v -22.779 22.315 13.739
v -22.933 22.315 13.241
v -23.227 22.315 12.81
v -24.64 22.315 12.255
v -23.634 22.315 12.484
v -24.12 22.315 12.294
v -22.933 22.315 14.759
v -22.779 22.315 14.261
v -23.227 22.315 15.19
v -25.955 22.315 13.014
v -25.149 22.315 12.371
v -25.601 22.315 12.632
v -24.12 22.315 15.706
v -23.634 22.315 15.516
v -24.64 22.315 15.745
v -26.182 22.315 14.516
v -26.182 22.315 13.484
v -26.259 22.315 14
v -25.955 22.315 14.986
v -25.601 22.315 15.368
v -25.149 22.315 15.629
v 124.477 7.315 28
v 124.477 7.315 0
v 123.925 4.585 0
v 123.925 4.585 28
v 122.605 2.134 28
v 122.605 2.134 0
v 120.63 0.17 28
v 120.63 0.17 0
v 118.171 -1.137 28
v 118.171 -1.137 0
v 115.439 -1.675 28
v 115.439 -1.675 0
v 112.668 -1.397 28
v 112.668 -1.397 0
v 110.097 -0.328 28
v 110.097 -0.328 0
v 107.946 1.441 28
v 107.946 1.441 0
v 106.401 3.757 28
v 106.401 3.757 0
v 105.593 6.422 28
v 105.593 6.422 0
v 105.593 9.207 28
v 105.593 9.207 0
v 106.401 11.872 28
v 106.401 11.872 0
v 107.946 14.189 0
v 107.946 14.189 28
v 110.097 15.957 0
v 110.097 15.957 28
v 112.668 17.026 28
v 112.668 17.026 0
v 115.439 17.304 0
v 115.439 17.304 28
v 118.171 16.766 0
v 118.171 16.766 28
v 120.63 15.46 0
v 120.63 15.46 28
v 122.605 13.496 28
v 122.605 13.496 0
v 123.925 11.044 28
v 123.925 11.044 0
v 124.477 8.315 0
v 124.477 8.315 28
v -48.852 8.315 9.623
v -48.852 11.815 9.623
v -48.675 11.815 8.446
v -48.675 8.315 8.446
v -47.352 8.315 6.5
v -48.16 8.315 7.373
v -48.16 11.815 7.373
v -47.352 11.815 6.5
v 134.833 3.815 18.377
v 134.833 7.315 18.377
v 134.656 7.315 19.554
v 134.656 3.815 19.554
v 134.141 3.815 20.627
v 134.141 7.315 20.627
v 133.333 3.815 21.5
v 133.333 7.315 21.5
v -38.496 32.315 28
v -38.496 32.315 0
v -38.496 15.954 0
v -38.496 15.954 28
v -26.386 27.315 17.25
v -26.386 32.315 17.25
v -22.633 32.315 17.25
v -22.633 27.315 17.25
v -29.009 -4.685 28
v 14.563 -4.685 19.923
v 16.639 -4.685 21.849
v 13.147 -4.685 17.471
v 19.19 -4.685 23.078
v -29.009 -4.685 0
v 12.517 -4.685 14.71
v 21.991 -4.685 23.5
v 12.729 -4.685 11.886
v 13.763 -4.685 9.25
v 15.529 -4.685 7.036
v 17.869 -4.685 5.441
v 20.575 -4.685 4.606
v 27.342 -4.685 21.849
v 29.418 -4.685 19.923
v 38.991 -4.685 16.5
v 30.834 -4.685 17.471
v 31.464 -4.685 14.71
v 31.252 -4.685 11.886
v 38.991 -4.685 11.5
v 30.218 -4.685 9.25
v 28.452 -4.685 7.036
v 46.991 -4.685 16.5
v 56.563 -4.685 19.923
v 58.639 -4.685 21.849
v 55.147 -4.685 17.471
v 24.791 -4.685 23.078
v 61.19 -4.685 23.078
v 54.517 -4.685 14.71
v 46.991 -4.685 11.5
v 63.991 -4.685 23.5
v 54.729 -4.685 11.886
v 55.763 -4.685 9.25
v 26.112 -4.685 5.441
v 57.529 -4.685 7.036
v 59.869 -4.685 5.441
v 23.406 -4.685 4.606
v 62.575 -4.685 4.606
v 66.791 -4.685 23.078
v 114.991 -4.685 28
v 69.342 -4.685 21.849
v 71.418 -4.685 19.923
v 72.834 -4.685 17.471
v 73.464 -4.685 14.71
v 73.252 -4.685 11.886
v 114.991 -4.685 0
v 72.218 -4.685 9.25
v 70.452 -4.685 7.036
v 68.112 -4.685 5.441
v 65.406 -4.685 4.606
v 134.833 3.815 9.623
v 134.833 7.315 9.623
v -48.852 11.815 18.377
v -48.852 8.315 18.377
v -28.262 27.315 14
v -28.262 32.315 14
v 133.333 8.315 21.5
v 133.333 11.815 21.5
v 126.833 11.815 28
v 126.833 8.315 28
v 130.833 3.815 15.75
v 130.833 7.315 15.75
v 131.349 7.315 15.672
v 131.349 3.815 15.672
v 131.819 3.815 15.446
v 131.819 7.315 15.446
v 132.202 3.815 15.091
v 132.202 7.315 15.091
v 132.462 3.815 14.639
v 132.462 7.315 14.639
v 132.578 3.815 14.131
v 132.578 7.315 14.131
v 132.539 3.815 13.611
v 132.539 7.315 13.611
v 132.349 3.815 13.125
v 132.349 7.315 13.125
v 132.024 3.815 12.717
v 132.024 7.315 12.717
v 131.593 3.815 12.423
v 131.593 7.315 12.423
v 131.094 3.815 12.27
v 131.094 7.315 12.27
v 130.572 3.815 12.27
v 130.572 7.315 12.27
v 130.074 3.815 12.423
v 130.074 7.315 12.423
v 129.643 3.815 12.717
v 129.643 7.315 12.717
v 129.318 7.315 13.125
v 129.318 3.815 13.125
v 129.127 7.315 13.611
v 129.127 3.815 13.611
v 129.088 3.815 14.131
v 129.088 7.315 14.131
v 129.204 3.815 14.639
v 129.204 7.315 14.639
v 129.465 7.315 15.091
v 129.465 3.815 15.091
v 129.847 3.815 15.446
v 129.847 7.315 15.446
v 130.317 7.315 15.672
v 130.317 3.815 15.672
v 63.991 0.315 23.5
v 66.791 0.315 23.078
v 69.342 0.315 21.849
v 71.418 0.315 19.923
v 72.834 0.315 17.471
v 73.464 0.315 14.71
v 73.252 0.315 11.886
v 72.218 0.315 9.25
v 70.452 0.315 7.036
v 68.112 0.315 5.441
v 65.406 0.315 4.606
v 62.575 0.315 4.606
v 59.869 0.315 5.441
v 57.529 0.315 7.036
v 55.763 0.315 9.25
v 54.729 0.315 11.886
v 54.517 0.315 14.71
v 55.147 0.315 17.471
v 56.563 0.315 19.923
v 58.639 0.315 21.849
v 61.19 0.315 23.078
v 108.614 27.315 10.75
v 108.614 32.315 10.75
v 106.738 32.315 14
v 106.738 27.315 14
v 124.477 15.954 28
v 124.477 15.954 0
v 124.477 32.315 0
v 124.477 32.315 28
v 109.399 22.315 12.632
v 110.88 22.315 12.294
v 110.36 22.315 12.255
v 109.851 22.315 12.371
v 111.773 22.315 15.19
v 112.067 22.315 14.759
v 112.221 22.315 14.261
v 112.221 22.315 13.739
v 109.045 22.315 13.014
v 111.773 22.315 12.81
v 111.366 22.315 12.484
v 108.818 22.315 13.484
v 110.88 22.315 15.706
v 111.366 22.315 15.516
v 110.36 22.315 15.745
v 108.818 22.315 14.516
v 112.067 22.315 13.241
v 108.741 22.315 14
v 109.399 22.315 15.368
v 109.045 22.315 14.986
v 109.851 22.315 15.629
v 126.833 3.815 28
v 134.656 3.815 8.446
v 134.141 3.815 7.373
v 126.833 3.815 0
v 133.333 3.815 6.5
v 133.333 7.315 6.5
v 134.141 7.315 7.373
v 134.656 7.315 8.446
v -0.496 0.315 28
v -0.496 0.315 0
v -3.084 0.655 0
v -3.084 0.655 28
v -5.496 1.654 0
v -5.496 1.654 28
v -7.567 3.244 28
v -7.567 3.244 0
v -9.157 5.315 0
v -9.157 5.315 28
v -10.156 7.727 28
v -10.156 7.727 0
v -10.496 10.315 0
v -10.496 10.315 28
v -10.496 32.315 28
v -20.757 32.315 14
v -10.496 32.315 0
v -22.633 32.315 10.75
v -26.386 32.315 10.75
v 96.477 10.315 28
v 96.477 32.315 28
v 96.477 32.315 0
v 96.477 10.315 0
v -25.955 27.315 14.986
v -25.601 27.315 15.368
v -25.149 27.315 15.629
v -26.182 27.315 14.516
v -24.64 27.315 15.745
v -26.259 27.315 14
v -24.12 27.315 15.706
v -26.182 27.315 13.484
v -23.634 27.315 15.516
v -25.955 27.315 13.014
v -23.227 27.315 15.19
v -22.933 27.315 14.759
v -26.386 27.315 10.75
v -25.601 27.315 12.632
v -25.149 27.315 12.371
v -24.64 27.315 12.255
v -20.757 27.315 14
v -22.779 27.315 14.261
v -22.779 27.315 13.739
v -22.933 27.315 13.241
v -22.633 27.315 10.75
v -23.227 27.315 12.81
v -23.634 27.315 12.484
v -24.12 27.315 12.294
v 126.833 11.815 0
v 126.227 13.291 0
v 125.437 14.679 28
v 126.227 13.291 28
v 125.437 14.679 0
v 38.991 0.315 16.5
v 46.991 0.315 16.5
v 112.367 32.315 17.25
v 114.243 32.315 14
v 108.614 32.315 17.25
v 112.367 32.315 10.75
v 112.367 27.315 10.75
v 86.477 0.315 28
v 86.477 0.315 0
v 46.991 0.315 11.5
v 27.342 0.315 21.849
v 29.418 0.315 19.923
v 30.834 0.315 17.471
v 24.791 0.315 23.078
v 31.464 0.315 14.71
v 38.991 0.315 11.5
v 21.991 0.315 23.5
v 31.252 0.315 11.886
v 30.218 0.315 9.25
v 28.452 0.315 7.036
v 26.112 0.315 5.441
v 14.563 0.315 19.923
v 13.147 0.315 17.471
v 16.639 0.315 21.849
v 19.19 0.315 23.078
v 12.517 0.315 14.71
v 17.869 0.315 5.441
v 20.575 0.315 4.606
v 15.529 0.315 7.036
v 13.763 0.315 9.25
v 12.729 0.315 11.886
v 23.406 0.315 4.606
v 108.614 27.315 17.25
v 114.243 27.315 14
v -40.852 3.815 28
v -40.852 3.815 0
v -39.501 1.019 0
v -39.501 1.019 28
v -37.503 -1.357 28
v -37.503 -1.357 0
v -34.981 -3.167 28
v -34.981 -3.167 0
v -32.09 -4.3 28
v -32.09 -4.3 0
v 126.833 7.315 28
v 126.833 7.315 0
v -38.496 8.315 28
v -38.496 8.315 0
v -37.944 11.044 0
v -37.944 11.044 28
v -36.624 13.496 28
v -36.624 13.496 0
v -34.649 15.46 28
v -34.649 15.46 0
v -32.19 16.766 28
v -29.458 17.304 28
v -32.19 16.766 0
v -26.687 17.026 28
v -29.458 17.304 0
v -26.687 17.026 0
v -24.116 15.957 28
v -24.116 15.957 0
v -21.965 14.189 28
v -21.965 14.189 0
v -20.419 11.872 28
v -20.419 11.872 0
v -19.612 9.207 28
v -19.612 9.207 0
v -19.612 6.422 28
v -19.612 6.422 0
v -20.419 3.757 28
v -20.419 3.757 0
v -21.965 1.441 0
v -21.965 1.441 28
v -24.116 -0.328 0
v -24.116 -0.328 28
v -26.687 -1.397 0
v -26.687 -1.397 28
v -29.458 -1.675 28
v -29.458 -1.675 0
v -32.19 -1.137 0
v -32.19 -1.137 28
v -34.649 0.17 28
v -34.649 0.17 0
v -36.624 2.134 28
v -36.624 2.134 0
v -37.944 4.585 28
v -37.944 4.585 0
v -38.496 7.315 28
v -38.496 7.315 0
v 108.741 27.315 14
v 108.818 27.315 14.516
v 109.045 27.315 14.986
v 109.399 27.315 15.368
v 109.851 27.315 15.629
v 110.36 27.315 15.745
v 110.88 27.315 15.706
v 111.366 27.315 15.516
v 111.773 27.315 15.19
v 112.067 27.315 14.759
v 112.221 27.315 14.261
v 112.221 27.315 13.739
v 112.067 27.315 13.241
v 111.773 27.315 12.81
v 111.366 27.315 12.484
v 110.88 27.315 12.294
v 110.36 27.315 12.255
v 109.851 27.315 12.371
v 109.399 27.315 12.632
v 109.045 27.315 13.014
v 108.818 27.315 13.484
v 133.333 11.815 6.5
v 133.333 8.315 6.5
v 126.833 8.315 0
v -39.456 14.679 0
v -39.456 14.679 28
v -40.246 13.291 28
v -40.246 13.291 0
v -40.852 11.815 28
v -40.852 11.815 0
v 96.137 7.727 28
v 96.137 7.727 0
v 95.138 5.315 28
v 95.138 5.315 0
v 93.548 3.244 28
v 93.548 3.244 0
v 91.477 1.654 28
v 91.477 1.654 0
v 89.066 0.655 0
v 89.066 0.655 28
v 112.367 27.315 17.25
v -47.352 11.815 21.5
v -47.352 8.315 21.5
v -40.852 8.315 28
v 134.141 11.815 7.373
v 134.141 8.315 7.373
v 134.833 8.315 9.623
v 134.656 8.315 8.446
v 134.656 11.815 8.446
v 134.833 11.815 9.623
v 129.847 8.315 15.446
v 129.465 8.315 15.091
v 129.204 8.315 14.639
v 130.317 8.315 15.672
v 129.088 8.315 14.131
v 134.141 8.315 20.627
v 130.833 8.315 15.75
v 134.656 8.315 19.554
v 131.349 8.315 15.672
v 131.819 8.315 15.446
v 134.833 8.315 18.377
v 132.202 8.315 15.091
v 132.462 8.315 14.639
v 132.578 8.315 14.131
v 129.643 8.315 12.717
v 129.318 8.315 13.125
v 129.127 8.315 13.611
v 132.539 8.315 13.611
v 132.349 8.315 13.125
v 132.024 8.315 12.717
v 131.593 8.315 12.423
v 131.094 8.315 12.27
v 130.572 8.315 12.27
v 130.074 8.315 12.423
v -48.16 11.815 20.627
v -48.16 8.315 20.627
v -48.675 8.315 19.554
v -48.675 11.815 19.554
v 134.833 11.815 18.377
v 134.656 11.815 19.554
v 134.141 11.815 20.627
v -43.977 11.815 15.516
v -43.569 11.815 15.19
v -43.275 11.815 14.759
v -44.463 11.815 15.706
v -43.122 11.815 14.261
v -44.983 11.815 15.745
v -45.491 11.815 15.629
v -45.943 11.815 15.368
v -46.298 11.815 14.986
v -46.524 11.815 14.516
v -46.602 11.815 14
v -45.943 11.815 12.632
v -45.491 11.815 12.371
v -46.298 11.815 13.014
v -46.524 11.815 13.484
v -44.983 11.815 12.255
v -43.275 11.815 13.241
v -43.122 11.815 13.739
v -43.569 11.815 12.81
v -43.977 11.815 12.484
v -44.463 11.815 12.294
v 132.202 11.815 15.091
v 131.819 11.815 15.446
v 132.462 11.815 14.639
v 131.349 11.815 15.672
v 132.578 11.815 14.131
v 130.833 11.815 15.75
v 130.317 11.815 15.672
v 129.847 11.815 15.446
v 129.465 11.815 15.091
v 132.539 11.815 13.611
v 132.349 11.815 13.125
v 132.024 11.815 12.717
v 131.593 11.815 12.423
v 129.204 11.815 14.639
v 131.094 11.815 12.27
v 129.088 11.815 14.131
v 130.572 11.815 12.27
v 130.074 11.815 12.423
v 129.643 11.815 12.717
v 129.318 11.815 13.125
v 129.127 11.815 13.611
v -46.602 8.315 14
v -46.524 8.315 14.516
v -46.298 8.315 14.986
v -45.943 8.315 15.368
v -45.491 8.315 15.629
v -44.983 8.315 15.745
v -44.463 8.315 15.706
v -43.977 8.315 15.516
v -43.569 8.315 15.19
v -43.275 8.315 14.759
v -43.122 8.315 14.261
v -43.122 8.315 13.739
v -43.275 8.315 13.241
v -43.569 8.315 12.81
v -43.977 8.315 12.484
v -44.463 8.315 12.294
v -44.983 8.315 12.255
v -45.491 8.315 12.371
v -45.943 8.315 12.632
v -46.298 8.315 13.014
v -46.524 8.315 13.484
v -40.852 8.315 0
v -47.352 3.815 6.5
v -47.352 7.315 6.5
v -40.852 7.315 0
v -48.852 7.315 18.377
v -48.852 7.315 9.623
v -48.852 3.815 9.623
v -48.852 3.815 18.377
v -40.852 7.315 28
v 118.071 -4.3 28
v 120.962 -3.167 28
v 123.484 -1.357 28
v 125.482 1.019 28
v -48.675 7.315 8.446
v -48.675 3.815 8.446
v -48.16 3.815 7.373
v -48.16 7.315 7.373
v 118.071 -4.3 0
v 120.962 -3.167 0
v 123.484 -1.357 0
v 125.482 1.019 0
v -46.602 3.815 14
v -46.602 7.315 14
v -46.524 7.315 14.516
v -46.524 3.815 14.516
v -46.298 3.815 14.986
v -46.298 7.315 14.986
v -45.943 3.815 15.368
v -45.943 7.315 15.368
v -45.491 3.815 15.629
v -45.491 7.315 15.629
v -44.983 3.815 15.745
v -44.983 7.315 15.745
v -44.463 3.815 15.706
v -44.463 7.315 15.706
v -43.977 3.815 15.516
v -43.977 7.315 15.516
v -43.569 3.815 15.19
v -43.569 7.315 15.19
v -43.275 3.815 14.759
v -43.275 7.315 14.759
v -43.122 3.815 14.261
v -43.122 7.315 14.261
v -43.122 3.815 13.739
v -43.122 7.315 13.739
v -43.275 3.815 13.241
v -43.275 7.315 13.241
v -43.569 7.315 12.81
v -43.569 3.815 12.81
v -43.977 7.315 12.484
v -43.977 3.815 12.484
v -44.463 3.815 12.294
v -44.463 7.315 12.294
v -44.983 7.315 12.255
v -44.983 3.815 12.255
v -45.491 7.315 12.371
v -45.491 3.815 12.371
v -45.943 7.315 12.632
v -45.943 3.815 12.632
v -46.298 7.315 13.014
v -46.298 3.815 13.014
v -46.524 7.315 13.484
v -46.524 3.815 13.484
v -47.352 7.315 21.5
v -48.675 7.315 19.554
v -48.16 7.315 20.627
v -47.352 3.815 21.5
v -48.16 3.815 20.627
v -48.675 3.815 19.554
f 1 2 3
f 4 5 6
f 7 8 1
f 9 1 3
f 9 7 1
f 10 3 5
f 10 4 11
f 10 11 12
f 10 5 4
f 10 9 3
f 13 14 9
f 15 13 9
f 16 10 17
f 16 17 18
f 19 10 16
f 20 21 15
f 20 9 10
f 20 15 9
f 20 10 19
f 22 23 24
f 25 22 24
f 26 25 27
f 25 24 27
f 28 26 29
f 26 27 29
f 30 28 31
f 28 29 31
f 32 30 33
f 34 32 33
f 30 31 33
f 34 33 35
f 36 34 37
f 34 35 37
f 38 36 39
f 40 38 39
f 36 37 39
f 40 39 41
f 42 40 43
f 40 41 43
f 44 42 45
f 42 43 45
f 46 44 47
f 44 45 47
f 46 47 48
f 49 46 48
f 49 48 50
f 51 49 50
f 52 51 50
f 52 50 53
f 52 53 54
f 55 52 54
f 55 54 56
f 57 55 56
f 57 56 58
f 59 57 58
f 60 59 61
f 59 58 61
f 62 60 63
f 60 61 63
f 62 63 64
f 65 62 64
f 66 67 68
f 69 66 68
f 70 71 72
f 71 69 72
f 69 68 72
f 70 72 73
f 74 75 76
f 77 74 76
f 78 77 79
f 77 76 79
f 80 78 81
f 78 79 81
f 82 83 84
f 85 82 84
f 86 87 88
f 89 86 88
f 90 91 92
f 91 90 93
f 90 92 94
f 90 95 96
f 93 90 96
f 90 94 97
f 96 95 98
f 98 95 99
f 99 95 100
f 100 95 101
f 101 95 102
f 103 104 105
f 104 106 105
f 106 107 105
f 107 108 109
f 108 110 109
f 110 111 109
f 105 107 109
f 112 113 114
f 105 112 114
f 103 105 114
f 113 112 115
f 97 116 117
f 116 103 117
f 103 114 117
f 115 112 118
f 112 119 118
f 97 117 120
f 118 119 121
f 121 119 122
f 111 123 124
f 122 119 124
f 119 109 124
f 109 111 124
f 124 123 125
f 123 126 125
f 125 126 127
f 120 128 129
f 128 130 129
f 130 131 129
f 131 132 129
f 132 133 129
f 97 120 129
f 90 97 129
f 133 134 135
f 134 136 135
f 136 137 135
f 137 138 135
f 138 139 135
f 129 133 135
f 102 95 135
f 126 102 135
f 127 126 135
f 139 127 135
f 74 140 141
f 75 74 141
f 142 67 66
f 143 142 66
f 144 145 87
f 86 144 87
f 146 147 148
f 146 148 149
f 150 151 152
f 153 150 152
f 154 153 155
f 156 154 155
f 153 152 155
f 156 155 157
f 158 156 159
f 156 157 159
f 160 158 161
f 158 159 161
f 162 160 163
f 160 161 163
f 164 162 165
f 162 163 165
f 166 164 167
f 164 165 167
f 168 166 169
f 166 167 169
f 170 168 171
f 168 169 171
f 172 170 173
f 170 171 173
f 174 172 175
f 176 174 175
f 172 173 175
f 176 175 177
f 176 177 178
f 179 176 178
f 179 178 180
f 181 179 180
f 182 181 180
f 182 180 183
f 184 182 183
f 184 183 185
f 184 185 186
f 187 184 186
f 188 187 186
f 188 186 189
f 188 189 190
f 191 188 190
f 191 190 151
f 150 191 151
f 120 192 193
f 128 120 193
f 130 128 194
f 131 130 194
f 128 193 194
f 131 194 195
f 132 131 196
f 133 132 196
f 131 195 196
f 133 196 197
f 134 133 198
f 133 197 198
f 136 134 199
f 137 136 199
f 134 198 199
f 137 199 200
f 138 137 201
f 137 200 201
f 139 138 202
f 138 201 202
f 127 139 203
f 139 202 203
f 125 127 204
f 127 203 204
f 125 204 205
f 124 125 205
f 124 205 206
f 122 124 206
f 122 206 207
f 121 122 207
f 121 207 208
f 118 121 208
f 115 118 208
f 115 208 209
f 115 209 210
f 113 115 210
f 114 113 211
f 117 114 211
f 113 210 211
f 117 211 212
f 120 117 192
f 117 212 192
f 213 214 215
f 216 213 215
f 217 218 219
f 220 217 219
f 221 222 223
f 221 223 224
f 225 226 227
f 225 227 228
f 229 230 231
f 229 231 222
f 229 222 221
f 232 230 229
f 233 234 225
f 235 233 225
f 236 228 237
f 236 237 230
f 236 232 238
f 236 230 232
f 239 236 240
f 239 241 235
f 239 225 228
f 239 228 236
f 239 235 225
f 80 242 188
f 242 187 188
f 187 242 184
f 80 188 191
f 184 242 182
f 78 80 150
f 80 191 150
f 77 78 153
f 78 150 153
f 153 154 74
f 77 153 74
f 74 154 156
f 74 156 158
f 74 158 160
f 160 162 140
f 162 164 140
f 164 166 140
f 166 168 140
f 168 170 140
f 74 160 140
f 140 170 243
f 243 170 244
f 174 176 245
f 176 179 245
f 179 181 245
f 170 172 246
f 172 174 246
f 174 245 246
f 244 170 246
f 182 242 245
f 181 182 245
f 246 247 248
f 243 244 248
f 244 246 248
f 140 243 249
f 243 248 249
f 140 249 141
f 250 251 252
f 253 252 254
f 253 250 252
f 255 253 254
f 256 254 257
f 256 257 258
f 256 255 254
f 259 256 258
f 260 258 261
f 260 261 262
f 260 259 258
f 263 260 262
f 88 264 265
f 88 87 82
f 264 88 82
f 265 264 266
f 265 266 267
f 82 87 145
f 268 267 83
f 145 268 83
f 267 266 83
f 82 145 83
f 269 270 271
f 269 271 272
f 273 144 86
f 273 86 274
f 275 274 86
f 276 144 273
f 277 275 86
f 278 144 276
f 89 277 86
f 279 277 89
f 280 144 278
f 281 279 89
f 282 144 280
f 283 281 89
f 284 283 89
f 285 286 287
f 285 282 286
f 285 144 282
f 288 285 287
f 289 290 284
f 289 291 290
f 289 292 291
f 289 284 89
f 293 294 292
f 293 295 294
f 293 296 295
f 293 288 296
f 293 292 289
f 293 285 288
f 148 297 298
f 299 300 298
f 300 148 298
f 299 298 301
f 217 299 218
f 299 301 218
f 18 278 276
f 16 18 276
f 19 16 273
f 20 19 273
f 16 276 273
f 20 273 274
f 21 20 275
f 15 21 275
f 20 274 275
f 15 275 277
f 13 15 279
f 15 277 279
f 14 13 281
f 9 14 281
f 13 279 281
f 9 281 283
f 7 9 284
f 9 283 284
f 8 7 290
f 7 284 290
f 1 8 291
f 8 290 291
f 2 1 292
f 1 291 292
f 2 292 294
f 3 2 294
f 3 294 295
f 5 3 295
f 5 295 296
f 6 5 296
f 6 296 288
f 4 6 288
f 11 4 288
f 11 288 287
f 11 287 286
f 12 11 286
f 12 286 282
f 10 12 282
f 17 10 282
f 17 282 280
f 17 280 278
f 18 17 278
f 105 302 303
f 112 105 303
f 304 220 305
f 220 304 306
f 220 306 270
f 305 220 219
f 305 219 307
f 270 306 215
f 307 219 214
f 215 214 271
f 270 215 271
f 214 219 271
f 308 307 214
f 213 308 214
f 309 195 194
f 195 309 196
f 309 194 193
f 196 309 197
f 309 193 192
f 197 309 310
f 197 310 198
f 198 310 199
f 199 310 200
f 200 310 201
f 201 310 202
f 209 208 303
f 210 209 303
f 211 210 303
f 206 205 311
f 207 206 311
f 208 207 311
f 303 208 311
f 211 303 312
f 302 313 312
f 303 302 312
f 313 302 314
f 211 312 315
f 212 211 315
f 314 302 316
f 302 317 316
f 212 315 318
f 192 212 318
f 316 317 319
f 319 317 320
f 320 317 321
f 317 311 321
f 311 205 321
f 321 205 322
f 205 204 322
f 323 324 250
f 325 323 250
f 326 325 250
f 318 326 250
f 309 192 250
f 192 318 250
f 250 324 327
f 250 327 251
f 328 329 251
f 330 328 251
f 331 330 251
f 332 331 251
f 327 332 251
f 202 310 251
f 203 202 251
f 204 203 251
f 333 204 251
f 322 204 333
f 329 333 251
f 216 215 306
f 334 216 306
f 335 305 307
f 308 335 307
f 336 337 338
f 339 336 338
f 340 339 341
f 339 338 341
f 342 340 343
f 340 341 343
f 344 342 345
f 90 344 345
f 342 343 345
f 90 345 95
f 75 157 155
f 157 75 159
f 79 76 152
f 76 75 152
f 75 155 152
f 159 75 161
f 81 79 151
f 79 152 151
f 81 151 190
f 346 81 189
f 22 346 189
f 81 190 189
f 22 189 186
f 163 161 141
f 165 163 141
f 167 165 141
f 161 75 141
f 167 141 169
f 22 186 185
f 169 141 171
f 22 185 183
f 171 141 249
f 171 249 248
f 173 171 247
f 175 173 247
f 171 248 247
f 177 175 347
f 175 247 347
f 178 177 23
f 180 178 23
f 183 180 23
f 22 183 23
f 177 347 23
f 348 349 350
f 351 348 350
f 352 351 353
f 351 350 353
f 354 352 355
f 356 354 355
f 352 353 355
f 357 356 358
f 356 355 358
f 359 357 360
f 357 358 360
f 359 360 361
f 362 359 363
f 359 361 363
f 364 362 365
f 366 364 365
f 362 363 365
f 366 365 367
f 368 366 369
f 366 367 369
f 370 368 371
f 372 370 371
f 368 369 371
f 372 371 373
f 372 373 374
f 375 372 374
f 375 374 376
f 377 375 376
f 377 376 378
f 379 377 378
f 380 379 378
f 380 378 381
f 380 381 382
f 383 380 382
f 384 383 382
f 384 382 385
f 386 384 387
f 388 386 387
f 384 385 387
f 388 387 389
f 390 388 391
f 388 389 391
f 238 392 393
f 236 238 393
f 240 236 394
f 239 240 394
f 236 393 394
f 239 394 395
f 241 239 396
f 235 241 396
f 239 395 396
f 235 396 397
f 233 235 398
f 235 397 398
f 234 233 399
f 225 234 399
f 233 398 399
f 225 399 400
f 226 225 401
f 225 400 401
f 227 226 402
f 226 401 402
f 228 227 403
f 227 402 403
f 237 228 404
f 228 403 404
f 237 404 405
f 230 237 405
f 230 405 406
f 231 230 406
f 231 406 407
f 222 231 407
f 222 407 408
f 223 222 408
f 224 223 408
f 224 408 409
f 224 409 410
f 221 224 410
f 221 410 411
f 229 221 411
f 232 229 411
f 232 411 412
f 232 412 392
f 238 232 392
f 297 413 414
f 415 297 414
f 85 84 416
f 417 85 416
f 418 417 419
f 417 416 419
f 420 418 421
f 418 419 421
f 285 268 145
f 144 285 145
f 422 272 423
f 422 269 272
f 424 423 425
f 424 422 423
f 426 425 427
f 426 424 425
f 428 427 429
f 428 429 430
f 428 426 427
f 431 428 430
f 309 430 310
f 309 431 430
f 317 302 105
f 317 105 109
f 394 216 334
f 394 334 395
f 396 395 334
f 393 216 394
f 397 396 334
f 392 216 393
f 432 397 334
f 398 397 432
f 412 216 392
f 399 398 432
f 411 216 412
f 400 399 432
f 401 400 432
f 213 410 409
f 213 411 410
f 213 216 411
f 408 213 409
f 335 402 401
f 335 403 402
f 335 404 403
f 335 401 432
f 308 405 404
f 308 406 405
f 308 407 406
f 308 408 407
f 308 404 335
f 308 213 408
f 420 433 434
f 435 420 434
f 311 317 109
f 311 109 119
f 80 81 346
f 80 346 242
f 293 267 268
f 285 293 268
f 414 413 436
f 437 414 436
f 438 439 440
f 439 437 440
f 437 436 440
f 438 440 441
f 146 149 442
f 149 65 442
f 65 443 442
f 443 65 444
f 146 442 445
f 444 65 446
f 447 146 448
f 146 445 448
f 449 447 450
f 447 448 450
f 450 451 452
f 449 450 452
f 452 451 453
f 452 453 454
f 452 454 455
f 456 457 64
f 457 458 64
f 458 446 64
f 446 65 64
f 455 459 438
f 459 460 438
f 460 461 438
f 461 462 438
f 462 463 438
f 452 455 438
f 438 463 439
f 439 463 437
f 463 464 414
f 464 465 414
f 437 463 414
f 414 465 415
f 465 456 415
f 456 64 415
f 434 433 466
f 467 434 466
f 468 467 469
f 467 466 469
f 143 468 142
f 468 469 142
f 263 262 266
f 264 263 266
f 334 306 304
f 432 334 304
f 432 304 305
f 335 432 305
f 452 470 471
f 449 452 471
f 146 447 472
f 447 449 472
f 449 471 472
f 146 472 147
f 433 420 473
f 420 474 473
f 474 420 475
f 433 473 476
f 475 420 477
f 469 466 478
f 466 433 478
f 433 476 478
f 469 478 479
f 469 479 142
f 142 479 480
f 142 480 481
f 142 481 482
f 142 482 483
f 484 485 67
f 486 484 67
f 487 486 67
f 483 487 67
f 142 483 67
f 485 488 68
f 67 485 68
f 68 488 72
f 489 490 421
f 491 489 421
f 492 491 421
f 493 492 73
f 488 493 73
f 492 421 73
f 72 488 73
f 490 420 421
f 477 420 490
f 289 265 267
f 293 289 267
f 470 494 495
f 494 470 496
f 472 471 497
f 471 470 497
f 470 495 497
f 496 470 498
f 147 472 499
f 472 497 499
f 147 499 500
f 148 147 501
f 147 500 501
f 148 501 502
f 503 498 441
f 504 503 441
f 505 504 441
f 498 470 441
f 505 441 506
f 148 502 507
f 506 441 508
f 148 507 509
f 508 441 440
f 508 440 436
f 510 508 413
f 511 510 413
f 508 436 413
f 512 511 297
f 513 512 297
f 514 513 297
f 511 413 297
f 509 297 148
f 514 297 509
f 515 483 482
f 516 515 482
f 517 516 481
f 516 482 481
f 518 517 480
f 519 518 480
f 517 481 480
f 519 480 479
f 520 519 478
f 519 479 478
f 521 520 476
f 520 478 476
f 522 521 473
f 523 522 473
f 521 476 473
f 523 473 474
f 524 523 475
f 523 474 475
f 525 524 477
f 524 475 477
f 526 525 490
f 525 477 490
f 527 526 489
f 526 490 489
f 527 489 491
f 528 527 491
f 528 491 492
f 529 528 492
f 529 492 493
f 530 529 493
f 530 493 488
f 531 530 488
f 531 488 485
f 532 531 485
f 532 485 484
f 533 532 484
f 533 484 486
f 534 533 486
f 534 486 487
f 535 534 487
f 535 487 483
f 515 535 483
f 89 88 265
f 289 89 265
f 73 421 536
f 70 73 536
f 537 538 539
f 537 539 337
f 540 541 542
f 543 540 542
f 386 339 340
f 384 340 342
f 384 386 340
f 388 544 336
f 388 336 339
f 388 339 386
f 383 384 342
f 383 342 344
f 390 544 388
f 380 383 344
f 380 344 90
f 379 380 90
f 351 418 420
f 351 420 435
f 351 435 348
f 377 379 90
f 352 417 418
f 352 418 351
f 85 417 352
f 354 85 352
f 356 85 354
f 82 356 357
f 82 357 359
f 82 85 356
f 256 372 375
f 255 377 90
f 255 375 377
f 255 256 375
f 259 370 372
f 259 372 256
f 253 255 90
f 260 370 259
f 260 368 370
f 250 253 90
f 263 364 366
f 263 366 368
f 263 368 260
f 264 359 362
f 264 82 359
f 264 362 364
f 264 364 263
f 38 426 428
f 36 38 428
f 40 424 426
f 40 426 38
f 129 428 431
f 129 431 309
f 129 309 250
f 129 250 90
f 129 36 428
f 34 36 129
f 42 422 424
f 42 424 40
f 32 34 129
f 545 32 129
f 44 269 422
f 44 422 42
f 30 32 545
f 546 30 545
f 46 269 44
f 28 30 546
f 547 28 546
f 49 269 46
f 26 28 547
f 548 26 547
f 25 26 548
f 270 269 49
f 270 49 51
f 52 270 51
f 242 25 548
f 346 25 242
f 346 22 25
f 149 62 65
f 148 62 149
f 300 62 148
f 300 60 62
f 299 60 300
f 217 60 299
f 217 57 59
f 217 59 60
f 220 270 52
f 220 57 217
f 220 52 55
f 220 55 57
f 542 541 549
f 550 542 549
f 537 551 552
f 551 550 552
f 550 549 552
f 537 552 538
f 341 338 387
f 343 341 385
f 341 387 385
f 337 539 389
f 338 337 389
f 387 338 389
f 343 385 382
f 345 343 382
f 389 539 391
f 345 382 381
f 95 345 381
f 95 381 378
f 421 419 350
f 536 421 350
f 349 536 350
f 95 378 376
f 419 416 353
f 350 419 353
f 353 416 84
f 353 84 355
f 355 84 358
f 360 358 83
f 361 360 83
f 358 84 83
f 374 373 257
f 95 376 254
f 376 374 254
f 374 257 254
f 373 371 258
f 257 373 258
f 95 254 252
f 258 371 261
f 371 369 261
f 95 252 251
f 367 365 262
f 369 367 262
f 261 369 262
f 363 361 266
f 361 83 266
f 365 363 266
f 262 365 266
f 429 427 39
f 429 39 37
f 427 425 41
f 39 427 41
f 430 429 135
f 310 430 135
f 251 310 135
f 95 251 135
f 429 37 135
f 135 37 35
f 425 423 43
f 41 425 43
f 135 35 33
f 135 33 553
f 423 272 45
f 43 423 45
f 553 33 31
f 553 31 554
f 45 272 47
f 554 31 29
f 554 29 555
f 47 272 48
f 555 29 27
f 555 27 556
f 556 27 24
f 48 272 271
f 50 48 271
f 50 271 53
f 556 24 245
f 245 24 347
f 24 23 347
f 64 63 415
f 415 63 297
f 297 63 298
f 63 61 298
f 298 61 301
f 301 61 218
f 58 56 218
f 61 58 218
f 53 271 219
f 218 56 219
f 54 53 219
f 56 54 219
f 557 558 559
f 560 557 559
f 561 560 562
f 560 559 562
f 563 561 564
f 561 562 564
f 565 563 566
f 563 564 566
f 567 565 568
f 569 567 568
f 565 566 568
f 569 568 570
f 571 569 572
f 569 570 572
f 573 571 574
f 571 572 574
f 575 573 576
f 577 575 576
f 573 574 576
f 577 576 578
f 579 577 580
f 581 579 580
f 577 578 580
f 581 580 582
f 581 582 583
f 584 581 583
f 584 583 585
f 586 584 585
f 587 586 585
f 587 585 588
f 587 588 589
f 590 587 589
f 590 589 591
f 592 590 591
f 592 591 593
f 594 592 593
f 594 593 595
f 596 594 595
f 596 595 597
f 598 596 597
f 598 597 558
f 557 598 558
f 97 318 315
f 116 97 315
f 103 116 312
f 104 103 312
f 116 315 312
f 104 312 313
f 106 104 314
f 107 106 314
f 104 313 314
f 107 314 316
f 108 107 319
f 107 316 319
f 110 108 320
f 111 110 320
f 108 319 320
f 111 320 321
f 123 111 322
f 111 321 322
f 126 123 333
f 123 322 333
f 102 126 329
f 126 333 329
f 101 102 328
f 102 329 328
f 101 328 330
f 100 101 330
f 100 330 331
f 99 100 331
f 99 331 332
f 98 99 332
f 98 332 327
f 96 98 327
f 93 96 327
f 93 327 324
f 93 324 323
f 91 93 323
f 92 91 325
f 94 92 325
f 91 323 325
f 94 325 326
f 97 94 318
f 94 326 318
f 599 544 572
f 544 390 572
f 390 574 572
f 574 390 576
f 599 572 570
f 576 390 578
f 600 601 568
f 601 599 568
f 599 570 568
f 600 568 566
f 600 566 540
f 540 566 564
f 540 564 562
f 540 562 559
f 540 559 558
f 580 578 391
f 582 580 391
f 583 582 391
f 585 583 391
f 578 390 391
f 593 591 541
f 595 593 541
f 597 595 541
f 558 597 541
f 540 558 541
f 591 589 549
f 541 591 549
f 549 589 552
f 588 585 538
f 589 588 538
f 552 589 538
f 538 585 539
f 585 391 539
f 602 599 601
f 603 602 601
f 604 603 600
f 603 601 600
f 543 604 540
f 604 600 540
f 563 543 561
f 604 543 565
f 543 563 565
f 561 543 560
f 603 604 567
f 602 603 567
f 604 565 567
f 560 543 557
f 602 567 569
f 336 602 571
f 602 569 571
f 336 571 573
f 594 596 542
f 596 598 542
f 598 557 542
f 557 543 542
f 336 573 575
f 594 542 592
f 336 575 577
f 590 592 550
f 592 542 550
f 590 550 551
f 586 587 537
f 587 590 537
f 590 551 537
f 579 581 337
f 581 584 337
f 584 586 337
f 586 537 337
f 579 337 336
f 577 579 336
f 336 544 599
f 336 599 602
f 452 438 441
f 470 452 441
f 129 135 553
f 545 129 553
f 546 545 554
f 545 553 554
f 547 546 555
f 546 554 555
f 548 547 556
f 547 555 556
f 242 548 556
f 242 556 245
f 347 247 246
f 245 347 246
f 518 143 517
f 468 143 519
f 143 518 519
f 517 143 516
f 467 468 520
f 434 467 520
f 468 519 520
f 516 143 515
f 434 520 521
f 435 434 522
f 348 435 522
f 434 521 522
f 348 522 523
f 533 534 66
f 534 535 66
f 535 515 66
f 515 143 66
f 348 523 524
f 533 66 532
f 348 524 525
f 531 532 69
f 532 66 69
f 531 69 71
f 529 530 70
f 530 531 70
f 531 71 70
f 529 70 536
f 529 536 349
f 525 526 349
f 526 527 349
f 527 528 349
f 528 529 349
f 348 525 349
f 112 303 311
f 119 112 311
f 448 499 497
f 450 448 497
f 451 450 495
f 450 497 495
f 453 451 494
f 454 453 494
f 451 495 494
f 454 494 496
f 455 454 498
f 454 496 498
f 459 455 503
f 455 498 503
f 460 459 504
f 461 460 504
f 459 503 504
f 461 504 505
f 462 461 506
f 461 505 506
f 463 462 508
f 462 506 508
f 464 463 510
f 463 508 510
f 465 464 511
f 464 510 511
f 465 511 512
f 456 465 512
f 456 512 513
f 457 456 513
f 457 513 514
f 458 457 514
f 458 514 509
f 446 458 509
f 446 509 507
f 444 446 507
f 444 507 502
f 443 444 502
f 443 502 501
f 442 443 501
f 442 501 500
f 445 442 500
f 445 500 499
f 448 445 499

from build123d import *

# Parameters (mm, degrees)
BOSS_EXTRUDE3_DEPTH = 28
FILLET1_R           = 10
SKETCH8_R           = 9.5
SKETCH8_W           = 8
SKETCH8_H           = 5
CUT_EXTRUDE4_DEPTH  = 5
SKETCH9_R           = 1.75
CUT_EXTRUDE5_DEPTH  = 20
SKETCH10_R          = 1.75
CUT_EXTRUDE6_DEPTH  = 10
CUT_EXTRUDE8_DEPTH  = 10
CHAMFER1_SIZE       = 6.5
FILLET3_R           = 4
CUT_EXTRUDE9_DEPTH  = 5


# Some blends are built 0.0001 mm under size
with BuildPart() as part:
    # Sketch7 → Boss-Extrude3 (new body)
    with BuildSketch(Plane.XY):
        with BuildLine():
            Line((-29.009414831, -4.685297633), (114.990585169, -4.685297633))
            ThreePointArc((114.990585169, -4.685297633), (122.279275038, -2.340345638), (126.833304451, 3.814702367))
            Line((126.833304451, 3.814702367), (134.833304451, 3.814702367))
            Line((134.833304451, 3.814702367), (134.833304451, 7.314702367))
            Line((134.833304451, 7.314702367), (127.480581166, 7.314702367))
            Line((127.480581166, 7.314702367), (124.47741815, 7.314702367))
            ThreePointArc((124.47741815, 7.314702367), (105.490585169, 7.814702367), (124.47741815, 8.314702367))
            Line((124.47741815, 8.314702367), (127.480581166, 8.314702367))
            Line((127.480581166, 8.314702367), (134.833304451, 8.314702367))
            Line((134.833304451, 8.314702367), (134.833304451, 11.814702367))
            Line((134.833304451, 11.814702367), (126.833304451, 11.814702367))
            ThreePointArc((126.833304451, 11.814702367), (125.854338173, 13.997652364), (124.47741815, 15.954112665))
            Line((124.47741815, 15.954112665), (124.47741815, 32.314702367))
            Line((124.47741815, 32.314702367), (96.47741815, 32.314702367))
            Line((96.47741815, 32.314702367), (96.47741815, 0.314702367))
            Line((96.47741815, 0.314702367), (-10.496247811, 0.314702367))
            Line((-10.496247811, 0.314702367), (-10.496247811, 32.314702367))
            Line((-10.496247811, 32.314702367), (-38.496247811, 32.314702367))
            Line((-38.496247811, 32.314702367), (-38.496247811, 15.954112665))
            ThreePointArc((-38.496247811, 15.954112665), (-39.873167835, 13.997652364), (-40.852134113, 11.814702367))
            Line((-40.852134113, 11.814702367), (-48.852134113, 11.814702367))
            Line((-48.852134113, 11.814702367), (-48.852134113, 8.314702367))
            Line((-48.852134113, 8.314702367), (-41.499410828, 8.314702367))
            Line((-41.499410828, 8.314702367), (-38.496247811, 8.314702367))
            ThreePointArc((-38.496247811, 8.314702367), (-19.509414831, 7.814702367), (-38.496247811, 7.314702367))
            Line((-38.496247811, 7.314702367), (-41.499410828, 7.314702367))
            Line((-41.499410828, 7.314702367), (-48.852134113, 7.314702367))
            Line((-48.852134113, 7.314702367), (-48.852134113, 3.814702367))
            Line((-48.852134113, 3.814702367), (-40.852134113, 3.814702367))
            ThreePointArc((-40.852134113, 3.814702367), (-36.298104699, -2.340345638), (-29.009414831, -4.685297633))
        make_face()
    extrude(amount=BOSS_EXTRUDE3_DEPTH)

    # Fillet1
    fillet1_edges = [part.edges().sort_by_distance(p)[0] for p in [
        (-10.496247811, 0.314702367, 14),
        (96.47741815, 0.314702367, 14),
    ]]
    fillet(fillet1_edges, radius=FILLET1_R)

    # Sketch8 → Cut-Extrude4 (cut)
    with BuildSketch(Plane(origin=(0, 0.314702367, 0), x_dir=(1, 0, 0), z_dir=(0, 1, 0))):
        with Locations(Location((63.990585169, -14, 0), (0, 0, 270))):
            Circle(SKETCH8_R)
        with Locations(Location((21.990585169, -14, 0), (0, 0, 270))):
            Circle(SKETCH8_R)
        with Locations((42.990585169, -14)):
            Rectangle(SKETCH8_W, SKETCH8_H)
    extrude(amount=-CUT_EXTRUDE4_DEPTH, mode=Mode.SUBTRACT)

    # Sketch9 → Cut-Extrude5 (cut)
    with BuildSketch(Plane(origin=(0, 11.814702367, 0), x_dir=(1, 0, 0), z_dir=(0, 1, 0))):
        with Locations(Location((130.833304451, -14, 0), (0, 0, 270))):
            Circle(SKETCH9_R)
        with Locations(Location((-44.852134113, -14, 0), (0, 0, 180))):
            Circle(SKETCH9_R)
    extrude(amount=-CUT_EXTRUDE5_DEPTH, mode=Mode.SUBTRACT)

    # Sketch10 → Cut-Extrude6 (cut)
    with BuildSketch(Plane(origin=(0, 32.314702367, 0), x_dir=(1, 0, 0), z_dir=(0, 1, 0))):
        with Locations(Location((110.490585169, -14, 0), (0, 0, 180))):
            Circle(SKETCH10_R)
        with Locations(Location((-24.509414831, -14, 0), (0, 0, 180))):
            Circle(SKETCH10_R)
    extrude(amount=-CUT_EXTRUDE6_DEPTH, mode=Mode.SUBTRACT)

    # Sketch12 → Cut-Extrude8 (cut)
    with BuildSketch(Plane(origin=(0, 11.814702367, 0), x_dir=(1, 0, 0), z_dir=(0, 1, 0))):
        Polygon((130.833304451, -21.5), (126.833304451, -21.5), (126.833304451, -28), (134.833304451, -28), (134.833304451, -21.5), align=None)
        Polygon((130.833304451, -6.5), (126.833304451, -6.5), (126.833304451, 0), (134.833304451, 0), (134.833304451, -6.5), align=None)
        Polygon((-44.852134113, -6.5), (-40.852134113, -6.5), (-40.852134113, 0), (-48.852134113, 0), (-48.852134113, -6.5), align=None)
        Polygon((-44.852134113, -21.5), (-48.852134113, -21.5), (-48.852134113, -28), (-40.852134113, -28), (-40.852134113, -21.5), align=None)
    extrude(amount=-CUT_EXTRUDE8_DEPTH, mode=Mode.SUBTRACT)

    # Chamfer1
    chamfer1_edges = [part.edges().sort_by_distance(p)[0] for p in [
        (126.833304451, 10.064702367, 6.5),
        (126.833304451, 5.564702367, 6.5),
        (126.833304451, 5.564702367, 21.5),
        (126.833304451, 10.064702367, 21.5),
        (-40.852134113, 5.564702367, 21.5),
        (-40.852134113, 5.564702367, 6.5),
        (-40.852134113, 10.064702367, 6.5),
        (-40.852134113, 10.064702367, 21.5),
    ]]
    chamfer(chamfer1_edges, length=CHAMFER1_SIZE - 0.0001)  # a hair under: the kernel refuses the full size

    # Fillet3
    # the kernel refuses this fillet: 4 mm, written as the material it takes off along each edge
    with BuildSketch(Plane(origin=(134.833304451, 19.621150019, 21.5), x_dir=(-1, 0, 0), z_dir=(0, -1, 0))) as fillet3_piece_1:
        with BuildLine():
            CenterArc((4, 3.122579061), FILLET3_R, 180, 51.319647456)
            Line((0, 3.122579061), (-0.08, 3.122579061))
            Line((-0.08, 3.122579061), (-0.08, 0))
            Line((-0.08, 0), (0, -0.08))
            ThreePointArc((0, -0.08), (0.75005, -0.08), (1.450102, -0.062451581))
            Line((1.450102, -0.062451581), (1.5001, 0))
        make_face()
    extrude(amount=19.112895303, mode=Mode.SUBTRACT)
    with BuildSketch(Plane(origin=(134.833304451, 15.121150019, 21.5), x_dir=(0, 0, -1), z_dir=(0, -1, 0)), Plane(origin=(-48.852134113, 15.121150019, 6.5), x_dir=(0, 0, 1), z_dir=(0, -1, 0)), Plane(origin=(-48.852134113, 19.621150019, 6.5), x_dir=(0, 0, 1), z_dir=(0, -1, 0))) as fillet3_piece_2:
        with BuildLine():
            CenterArc((3.122579061, -4), FILLET3_R, 90, 51.319647456)
            Line((0, -1.5001), (-0.062451581, -1.450102))
            ThreePointArc((-0.062451581, -1.450102), (-0.08, -0.75005), (-0.08, 0))
            Line((-0.08, 0), (0, 0.08))
            Line((0, 0.08), (3.122579061, 0.08))
            Line((3.122579061, 0.08), (3.122579061, 0))
        make_face()
    extrude(amount=19.112895303, mode=Mode.SUBTRACT)
    with BuildSketch(Plane(origin=(134.833304451, 15.121150019, 6.5), x_dir=(0, 0, 1), z_dir=(0, -1, 0)), Plane(origin=(134.833304451, 19.621150019, 6.5), x_dir=(0, 0, 1), z_dir=(0, -1, 0)), Plane(origin=(-48.852134113, 19.621150019, 21.5), x_dir=(0, 0, -1), z_dir=(0, -1, 0))) as fillet3_piece_3:
        with BuildLine():
            CenterArc((3.122579061, 4), FILLET3_R, 218.680352544, 51.319647456)
            Line((0, 1.5001), (-0.062451581, 1.450102))
            ThreePointArc((-0.062451581, 1.450102), (-0.08, 0.75005), (-0.08, 0))
            Line((-0.08, 0), (0, -0.08))
            Line((0, -0.08), (3.122579061, -0.08))
            Line((3.122579061, -0.08), (3.122579061, 0))
        make_face()
    extrude(amount=19.112895303, mode=Mode.SUBTRACT)
    with BuildSketch(Plane(origin=(-48.852134113, 15.121150019, 21.5), x_dir=(1, 0, 0), z_dir=(0, -1, 0))) as fillet3_piece_4:
        with BuildLine():
            CenterArc((4, -3.122579061), FILLET3_R, 128.680352544, 51.319647456)
            Line((0, -3.122579061), (-0.08, -3.122579061))
            Line((-0.08, -3.122579061), (-0.08, 0))
            Line((-0.08, 0), (0, 0.08))
            ThreePointArc((0, 0.08), (0.75005, 0.08), (1.450102, 0.062451581))
            Line((1.450102, 0.062451581), (1.5001, 0))
        make_face()
    extrude(amount=19.112895303, mode=Mode.SUBTRACT)

    # Sketch13 → Cut-Extrude9 (cut)
    with BuildSketch(Plane(origin=(0, 32.314702367, 0), x_dir=(1, 0, 0), z_dir=(0, 1, 0))):
        Polygon((108.614196794, -17.25), (112.366973544, -17.25), (114.243361919, -14), (112.366973544, -10.75), (108.614196794, -10.75), (106.737808419, -14), align=None)
        Polygon((-20.756638081, -14), (-22.633026456, -10.75), (-26.385803206, -10.75), (-28.262191581, -14), (-26.385803206, -17.25), (-22.633026456, -17.25), align=None)
    extrude(amount=-CUT_EXTRUDE9_DEPTH, mode=Mode.SUBTRACT)


solid = part.part
